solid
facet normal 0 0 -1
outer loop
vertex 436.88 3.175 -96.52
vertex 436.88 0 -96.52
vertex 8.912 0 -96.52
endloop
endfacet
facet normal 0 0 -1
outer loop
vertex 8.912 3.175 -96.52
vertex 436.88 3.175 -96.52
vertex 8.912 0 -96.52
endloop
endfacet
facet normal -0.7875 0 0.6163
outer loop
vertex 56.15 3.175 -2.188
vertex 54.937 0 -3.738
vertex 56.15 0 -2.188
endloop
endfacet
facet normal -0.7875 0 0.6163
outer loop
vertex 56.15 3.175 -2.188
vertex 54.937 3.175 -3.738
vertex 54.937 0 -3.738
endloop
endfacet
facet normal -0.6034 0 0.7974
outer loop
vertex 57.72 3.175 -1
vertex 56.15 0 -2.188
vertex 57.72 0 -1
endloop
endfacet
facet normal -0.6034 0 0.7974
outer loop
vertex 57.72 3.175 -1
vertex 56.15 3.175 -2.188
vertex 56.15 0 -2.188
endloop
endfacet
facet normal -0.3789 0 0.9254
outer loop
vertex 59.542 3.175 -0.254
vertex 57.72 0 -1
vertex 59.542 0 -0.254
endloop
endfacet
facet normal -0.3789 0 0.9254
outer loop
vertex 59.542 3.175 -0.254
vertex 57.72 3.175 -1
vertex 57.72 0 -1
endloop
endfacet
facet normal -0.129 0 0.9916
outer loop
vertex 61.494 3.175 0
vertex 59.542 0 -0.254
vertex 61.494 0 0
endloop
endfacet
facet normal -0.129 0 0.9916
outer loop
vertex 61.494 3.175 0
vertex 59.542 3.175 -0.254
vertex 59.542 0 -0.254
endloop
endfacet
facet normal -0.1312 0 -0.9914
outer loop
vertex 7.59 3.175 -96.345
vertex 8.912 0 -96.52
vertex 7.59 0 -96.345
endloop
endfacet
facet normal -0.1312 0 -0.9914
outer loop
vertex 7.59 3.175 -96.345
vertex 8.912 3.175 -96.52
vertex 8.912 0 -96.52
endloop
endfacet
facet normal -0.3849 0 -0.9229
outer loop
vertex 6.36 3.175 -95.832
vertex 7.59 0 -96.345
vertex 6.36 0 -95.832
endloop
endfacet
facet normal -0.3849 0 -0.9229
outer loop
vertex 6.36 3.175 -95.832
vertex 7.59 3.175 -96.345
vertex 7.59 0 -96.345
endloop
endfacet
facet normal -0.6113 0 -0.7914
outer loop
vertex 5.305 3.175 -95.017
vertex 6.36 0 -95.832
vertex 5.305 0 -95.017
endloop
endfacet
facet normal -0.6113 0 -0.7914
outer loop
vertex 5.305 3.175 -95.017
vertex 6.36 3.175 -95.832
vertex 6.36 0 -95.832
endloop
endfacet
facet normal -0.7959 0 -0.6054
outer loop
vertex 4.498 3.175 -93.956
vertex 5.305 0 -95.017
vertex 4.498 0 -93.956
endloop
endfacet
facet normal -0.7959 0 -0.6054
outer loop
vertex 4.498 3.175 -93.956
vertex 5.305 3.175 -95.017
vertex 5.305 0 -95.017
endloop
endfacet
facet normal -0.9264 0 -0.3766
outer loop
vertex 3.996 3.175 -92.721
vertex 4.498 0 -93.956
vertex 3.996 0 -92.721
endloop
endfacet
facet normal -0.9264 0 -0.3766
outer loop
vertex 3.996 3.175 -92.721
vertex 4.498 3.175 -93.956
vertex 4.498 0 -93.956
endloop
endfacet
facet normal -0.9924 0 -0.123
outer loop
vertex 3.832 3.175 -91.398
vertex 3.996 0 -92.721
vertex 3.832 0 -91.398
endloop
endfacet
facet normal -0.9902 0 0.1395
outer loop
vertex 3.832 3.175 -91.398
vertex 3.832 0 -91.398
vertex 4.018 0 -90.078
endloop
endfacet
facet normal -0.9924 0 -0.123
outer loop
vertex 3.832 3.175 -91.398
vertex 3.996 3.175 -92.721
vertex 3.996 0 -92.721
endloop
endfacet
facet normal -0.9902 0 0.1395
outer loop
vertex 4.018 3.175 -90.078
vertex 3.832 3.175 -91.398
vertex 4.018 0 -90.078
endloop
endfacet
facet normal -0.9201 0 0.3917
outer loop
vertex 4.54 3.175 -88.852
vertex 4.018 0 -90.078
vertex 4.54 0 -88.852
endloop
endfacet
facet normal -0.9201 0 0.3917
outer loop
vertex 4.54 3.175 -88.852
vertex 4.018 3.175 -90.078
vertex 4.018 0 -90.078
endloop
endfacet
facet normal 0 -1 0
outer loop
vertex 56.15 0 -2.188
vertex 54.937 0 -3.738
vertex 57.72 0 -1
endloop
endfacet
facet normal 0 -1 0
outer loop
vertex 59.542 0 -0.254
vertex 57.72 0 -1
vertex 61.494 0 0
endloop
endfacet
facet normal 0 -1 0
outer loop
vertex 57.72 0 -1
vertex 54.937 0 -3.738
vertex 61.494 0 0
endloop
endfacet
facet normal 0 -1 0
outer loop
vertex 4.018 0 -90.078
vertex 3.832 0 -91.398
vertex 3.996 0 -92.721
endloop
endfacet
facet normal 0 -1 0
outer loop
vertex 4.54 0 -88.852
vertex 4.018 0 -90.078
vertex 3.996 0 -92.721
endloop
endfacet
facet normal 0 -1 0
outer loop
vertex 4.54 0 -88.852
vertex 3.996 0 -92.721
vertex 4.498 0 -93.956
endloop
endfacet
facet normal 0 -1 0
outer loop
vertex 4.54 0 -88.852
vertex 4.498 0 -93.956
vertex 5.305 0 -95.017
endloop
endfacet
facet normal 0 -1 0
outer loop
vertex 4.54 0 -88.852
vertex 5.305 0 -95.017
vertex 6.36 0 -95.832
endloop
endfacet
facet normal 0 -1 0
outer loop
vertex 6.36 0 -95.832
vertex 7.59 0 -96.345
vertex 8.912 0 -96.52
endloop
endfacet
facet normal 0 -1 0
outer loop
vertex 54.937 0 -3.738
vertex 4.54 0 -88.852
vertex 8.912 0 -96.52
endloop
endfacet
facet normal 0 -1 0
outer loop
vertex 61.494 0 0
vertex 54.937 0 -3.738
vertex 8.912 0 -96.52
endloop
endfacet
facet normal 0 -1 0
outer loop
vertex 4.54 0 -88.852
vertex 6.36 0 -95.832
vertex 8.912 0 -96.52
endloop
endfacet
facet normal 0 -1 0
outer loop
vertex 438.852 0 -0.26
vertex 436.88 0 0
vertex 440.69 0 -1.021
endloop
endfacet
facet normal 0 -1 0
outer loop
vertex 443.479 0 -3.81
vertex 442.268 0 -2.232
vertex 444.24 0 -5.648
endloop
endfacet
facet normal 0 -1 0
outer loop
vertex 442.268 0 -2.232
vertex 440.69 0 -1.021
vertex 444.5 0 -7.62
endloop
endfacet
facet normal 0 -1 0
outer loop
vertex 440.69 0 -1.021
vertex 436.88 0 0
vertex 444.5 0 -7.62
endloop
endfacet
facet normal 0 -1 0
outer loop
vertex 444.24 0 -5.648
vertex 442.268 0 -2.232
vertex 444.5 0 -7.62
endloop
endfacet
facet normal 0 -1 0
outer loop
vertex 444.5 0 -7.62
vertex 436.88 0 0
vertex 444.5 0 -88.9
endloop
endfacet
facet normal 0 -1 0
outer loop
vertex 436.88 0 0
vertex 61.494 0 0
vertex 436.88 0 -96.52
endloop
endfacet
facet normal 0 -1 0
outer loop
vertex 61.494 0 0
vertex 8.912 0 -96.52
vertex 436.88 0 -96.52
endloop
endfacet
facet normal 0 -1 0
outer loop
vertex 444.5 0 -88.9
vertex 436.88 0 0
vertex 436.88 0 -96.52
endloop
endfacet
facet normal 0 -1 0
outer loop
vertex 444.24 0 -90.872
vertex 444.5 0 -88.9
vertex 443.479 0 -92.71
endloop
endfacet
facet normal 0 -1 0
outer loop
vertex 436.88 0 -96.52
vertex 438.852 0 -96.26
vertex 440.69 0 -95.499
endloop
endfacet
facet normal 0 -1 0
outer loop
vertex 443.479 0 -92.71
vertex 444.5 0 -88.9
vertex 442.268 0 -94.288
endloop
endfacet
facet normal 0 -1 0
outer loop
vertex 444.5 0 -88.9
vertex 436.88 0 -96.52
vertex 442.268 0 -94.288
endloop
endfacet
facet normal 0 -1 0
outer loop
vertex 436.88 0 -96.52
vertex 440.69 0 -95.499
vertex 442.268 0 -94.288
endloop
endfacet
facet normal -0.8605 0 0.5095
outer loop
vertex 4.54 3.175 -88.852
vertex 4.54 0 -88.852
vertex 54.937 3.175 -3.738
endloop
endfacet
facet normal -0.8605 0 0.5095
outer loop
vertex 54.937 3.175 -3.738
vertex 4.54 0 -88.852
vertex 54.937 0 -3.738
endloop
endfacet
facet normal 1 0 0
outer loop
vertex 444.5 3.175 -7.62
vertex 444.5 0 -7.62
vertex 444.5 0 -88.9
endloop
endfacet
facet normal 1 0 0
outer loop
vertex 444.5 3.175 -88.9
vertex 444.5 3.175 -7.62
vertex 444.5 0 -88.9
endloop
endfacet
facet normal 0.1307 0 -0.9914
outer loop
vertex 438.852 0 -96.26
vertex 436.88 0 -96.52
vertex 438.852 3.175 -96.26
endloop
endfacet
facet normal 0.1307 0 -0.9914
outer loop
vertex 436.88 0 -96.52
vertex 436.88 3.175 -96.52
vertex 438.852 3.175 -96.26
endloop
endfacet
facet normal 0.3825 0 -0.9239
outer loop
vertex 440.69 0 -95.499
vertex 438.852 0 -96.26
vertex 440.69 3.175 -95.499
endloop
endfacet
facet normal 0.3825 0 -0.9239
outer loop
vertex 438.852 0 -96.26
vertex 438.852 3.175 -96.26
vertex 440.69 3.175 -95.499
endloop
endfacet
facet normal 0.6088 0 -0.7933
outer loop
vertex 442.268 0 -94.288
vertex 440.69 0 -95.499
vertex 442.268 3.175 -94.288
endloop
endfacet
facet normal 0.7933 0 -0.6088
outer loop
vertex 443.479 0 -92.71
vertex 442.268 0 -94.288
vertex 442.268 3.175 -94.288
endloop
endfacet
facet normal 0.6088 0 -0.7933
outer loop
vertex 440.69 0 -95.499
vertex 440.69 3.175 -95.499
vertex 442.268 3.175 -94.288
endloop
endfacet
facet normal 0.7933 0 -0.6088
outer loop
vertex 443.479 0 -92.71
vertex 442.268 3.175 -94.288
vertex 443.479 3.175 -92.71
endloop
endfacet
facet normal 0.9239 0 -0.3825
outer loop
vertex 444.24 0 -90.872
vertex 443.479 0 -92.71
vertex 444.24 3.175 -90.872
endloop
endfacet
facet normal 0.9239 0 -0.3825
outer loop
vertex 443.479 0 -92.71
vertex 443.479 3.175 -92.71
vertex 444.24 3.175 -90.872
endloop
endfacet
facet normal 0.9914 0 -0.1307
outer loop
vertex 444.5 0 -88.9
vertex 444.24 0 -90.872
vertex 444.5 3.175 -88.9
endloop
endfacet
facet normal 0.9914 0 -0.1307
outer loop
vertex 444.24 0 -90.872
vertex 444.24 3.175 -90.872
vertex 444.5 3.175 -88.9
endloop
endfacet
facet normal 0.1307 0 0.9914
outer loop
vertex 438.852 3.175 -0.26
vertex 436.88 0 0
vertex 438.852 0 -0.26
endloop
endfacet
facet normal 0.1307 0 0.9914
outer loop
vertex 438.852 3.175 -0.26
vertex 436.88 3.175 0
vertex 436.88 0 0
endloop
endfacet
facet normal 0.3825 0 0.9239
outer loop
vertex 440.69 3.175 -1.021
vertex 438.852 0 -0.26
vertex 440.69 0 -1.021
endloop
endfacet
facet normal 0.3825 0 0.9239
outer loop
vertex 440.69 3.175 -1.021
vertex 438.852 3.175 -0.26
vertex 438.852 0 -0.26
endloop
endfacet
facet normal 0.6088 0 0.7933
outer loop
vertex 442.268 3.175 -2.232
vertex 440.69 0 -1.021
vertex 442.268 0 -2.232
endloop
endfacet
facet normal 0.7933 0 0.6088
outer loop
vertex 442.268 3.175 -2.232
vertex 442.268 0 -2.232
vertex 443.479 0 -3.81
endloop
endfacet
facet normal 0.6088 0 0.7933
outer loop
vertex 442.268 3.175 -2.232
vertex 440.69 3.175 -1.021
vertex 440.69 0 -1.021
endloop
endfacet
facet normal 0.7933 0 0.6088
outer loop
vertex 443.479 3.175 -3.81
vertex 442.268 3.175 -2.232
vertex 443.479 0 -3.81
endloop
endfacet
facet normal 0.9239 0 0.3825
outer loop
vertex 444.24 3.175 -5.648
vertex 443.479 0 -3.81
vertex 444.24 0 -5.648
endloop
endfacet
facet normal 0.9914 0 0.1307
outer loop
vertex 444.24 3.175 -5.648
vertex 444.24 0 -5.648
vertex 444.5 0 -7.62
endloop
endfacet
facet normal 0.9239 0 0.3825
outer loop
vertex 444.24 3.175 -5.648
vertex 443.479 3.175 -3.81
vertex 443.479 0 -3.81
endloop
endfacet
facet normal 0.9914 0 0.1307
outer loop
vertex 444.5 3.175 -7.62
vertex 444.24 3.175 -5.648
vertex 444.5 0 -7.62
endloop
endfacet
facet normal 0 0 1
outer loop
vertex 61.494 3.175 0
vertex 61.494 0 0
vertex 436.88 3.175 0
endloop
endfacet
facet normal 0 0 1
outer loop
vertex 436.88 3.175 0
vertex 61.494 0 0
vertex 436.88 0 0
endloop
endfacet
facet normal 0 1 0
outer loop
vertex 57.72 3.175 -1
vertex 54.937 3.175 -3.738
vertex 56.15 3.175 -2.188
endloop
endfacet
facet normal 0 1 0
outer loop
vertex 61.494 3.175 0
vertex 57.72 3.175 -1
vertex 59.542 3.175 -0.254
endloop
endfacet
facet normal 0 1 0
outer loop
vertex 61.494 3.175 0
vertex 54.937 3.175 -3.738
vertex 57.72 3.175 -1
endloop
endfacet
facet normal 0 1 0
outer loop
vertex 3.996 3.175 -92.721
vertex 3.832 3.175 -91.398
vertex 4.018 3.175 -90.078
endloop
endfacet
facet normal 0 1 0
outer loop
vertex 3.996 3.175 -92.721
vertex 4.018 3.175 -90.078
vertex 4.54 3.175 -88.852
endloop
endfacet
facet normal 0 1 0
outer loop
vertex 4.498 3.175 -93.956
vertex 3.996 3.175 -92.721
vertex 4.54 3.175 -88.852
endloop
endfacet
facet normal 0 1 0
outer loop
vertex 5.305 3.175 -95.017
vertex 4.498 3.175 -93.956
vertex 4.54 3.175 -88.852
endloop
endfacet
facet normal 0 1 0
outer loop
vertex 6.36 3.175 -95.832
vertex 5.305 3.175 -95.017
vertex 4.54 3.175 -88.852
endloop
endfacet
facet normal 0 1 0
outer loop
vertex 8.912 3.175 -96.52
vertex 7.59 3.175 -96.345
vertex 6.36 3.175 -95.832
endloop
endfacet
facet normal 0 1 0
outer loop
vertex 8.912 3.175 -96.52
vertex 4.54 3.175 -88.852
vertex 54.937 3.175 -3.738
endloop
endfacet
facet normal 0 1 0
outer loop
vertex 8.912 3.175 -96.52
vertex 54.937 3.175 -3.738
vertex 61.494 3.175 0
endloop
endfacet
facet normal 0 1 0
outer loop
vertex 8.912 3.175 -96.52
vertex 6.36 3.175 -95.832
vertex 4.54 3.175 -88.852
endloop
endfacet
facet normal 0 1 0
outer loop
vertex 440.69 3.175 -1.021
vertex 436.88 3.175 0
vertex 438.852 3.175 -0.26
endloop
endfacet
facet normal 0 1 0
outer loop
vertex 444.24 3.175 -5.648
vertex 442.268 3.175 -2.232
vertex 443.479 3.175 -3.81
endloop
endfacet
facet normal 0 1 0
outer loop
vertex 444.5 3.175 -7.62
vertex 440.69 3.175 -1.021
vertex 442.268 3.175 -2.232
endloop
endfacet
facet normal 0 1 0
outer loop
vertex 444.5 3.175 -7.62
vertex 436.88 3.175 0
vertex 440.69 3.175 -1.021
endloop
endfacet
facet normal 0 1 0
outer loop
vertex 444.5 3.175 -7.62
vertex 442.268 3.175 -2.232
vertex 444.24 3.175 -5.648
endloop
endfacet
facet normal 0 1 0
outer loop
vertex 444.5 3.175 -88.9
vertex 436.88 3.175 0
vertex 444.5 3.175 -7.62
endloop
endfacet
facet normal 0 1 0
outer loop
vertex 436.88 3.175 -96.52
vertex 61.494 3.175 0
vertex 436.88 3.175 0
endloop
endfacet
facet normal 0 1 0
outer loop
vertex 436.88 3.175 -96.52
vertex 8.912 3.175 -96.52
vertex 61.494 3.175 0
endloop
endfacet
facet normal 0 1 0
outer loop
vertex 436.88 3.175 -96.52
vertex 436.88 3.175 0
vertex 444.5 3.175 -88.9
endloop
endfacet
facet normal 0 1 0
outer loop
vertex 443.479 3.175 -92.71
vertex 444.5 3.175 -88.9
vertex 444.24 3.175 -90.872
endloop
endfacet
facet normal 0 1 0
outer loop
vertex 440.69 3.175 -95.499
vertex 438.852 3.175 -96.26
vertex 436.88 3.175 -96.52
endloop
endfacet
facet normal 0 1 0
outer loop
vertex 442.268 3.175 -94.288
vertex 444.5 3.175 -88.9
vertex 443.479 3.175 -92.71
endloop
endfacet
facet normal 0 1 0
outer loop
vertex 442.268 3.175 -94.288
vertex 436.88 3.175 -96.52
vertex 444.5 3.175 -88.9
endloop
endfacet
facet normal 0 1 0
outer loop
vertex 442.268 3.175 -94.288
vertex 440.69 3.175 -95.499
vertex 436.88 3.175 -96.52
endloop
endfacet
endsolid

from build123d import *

# Parameters (mm, degrees)
BOSS_EXTRUDE2_DEPTH = 3.175
FILLET3_R           = 7.62
FILLET4_R           = 5.08


with BuildPart() as part:
    # Sketch2 → Boss-Extrude2 (new body)
    with BuildSketch(Plane(origin=(0, 0, 0), x_dir=(1, 0, 0), z_dir=(0, 1, 0))):
        Polygon((444.5, 96.52), (0, 96.52), (57.15, 0), (444.5, 0), align=None)
    extrude(amount=BOSS_EXTRUDE2_DEPTH)

    # Fillet3
    fillet3_edges = [part.edges().sort_by_distance(p)[0] for p in [
        (57.15, 1.5875, 0),
        (444.5, 1.5875, -96.52),
        (444.5, 1.5875, 0),
    ]]
    fillet(fillet3_edges, radius=FILLET3_R)

    # Fillet4
    fillet4_edges = [part.edges().sort_by_distance(p)[0] for p in [
        (0, 1.5875, -96.52),
    ]]
    fillet(fillet4_edges, radius=FILLET4_R)


solid = part.part
